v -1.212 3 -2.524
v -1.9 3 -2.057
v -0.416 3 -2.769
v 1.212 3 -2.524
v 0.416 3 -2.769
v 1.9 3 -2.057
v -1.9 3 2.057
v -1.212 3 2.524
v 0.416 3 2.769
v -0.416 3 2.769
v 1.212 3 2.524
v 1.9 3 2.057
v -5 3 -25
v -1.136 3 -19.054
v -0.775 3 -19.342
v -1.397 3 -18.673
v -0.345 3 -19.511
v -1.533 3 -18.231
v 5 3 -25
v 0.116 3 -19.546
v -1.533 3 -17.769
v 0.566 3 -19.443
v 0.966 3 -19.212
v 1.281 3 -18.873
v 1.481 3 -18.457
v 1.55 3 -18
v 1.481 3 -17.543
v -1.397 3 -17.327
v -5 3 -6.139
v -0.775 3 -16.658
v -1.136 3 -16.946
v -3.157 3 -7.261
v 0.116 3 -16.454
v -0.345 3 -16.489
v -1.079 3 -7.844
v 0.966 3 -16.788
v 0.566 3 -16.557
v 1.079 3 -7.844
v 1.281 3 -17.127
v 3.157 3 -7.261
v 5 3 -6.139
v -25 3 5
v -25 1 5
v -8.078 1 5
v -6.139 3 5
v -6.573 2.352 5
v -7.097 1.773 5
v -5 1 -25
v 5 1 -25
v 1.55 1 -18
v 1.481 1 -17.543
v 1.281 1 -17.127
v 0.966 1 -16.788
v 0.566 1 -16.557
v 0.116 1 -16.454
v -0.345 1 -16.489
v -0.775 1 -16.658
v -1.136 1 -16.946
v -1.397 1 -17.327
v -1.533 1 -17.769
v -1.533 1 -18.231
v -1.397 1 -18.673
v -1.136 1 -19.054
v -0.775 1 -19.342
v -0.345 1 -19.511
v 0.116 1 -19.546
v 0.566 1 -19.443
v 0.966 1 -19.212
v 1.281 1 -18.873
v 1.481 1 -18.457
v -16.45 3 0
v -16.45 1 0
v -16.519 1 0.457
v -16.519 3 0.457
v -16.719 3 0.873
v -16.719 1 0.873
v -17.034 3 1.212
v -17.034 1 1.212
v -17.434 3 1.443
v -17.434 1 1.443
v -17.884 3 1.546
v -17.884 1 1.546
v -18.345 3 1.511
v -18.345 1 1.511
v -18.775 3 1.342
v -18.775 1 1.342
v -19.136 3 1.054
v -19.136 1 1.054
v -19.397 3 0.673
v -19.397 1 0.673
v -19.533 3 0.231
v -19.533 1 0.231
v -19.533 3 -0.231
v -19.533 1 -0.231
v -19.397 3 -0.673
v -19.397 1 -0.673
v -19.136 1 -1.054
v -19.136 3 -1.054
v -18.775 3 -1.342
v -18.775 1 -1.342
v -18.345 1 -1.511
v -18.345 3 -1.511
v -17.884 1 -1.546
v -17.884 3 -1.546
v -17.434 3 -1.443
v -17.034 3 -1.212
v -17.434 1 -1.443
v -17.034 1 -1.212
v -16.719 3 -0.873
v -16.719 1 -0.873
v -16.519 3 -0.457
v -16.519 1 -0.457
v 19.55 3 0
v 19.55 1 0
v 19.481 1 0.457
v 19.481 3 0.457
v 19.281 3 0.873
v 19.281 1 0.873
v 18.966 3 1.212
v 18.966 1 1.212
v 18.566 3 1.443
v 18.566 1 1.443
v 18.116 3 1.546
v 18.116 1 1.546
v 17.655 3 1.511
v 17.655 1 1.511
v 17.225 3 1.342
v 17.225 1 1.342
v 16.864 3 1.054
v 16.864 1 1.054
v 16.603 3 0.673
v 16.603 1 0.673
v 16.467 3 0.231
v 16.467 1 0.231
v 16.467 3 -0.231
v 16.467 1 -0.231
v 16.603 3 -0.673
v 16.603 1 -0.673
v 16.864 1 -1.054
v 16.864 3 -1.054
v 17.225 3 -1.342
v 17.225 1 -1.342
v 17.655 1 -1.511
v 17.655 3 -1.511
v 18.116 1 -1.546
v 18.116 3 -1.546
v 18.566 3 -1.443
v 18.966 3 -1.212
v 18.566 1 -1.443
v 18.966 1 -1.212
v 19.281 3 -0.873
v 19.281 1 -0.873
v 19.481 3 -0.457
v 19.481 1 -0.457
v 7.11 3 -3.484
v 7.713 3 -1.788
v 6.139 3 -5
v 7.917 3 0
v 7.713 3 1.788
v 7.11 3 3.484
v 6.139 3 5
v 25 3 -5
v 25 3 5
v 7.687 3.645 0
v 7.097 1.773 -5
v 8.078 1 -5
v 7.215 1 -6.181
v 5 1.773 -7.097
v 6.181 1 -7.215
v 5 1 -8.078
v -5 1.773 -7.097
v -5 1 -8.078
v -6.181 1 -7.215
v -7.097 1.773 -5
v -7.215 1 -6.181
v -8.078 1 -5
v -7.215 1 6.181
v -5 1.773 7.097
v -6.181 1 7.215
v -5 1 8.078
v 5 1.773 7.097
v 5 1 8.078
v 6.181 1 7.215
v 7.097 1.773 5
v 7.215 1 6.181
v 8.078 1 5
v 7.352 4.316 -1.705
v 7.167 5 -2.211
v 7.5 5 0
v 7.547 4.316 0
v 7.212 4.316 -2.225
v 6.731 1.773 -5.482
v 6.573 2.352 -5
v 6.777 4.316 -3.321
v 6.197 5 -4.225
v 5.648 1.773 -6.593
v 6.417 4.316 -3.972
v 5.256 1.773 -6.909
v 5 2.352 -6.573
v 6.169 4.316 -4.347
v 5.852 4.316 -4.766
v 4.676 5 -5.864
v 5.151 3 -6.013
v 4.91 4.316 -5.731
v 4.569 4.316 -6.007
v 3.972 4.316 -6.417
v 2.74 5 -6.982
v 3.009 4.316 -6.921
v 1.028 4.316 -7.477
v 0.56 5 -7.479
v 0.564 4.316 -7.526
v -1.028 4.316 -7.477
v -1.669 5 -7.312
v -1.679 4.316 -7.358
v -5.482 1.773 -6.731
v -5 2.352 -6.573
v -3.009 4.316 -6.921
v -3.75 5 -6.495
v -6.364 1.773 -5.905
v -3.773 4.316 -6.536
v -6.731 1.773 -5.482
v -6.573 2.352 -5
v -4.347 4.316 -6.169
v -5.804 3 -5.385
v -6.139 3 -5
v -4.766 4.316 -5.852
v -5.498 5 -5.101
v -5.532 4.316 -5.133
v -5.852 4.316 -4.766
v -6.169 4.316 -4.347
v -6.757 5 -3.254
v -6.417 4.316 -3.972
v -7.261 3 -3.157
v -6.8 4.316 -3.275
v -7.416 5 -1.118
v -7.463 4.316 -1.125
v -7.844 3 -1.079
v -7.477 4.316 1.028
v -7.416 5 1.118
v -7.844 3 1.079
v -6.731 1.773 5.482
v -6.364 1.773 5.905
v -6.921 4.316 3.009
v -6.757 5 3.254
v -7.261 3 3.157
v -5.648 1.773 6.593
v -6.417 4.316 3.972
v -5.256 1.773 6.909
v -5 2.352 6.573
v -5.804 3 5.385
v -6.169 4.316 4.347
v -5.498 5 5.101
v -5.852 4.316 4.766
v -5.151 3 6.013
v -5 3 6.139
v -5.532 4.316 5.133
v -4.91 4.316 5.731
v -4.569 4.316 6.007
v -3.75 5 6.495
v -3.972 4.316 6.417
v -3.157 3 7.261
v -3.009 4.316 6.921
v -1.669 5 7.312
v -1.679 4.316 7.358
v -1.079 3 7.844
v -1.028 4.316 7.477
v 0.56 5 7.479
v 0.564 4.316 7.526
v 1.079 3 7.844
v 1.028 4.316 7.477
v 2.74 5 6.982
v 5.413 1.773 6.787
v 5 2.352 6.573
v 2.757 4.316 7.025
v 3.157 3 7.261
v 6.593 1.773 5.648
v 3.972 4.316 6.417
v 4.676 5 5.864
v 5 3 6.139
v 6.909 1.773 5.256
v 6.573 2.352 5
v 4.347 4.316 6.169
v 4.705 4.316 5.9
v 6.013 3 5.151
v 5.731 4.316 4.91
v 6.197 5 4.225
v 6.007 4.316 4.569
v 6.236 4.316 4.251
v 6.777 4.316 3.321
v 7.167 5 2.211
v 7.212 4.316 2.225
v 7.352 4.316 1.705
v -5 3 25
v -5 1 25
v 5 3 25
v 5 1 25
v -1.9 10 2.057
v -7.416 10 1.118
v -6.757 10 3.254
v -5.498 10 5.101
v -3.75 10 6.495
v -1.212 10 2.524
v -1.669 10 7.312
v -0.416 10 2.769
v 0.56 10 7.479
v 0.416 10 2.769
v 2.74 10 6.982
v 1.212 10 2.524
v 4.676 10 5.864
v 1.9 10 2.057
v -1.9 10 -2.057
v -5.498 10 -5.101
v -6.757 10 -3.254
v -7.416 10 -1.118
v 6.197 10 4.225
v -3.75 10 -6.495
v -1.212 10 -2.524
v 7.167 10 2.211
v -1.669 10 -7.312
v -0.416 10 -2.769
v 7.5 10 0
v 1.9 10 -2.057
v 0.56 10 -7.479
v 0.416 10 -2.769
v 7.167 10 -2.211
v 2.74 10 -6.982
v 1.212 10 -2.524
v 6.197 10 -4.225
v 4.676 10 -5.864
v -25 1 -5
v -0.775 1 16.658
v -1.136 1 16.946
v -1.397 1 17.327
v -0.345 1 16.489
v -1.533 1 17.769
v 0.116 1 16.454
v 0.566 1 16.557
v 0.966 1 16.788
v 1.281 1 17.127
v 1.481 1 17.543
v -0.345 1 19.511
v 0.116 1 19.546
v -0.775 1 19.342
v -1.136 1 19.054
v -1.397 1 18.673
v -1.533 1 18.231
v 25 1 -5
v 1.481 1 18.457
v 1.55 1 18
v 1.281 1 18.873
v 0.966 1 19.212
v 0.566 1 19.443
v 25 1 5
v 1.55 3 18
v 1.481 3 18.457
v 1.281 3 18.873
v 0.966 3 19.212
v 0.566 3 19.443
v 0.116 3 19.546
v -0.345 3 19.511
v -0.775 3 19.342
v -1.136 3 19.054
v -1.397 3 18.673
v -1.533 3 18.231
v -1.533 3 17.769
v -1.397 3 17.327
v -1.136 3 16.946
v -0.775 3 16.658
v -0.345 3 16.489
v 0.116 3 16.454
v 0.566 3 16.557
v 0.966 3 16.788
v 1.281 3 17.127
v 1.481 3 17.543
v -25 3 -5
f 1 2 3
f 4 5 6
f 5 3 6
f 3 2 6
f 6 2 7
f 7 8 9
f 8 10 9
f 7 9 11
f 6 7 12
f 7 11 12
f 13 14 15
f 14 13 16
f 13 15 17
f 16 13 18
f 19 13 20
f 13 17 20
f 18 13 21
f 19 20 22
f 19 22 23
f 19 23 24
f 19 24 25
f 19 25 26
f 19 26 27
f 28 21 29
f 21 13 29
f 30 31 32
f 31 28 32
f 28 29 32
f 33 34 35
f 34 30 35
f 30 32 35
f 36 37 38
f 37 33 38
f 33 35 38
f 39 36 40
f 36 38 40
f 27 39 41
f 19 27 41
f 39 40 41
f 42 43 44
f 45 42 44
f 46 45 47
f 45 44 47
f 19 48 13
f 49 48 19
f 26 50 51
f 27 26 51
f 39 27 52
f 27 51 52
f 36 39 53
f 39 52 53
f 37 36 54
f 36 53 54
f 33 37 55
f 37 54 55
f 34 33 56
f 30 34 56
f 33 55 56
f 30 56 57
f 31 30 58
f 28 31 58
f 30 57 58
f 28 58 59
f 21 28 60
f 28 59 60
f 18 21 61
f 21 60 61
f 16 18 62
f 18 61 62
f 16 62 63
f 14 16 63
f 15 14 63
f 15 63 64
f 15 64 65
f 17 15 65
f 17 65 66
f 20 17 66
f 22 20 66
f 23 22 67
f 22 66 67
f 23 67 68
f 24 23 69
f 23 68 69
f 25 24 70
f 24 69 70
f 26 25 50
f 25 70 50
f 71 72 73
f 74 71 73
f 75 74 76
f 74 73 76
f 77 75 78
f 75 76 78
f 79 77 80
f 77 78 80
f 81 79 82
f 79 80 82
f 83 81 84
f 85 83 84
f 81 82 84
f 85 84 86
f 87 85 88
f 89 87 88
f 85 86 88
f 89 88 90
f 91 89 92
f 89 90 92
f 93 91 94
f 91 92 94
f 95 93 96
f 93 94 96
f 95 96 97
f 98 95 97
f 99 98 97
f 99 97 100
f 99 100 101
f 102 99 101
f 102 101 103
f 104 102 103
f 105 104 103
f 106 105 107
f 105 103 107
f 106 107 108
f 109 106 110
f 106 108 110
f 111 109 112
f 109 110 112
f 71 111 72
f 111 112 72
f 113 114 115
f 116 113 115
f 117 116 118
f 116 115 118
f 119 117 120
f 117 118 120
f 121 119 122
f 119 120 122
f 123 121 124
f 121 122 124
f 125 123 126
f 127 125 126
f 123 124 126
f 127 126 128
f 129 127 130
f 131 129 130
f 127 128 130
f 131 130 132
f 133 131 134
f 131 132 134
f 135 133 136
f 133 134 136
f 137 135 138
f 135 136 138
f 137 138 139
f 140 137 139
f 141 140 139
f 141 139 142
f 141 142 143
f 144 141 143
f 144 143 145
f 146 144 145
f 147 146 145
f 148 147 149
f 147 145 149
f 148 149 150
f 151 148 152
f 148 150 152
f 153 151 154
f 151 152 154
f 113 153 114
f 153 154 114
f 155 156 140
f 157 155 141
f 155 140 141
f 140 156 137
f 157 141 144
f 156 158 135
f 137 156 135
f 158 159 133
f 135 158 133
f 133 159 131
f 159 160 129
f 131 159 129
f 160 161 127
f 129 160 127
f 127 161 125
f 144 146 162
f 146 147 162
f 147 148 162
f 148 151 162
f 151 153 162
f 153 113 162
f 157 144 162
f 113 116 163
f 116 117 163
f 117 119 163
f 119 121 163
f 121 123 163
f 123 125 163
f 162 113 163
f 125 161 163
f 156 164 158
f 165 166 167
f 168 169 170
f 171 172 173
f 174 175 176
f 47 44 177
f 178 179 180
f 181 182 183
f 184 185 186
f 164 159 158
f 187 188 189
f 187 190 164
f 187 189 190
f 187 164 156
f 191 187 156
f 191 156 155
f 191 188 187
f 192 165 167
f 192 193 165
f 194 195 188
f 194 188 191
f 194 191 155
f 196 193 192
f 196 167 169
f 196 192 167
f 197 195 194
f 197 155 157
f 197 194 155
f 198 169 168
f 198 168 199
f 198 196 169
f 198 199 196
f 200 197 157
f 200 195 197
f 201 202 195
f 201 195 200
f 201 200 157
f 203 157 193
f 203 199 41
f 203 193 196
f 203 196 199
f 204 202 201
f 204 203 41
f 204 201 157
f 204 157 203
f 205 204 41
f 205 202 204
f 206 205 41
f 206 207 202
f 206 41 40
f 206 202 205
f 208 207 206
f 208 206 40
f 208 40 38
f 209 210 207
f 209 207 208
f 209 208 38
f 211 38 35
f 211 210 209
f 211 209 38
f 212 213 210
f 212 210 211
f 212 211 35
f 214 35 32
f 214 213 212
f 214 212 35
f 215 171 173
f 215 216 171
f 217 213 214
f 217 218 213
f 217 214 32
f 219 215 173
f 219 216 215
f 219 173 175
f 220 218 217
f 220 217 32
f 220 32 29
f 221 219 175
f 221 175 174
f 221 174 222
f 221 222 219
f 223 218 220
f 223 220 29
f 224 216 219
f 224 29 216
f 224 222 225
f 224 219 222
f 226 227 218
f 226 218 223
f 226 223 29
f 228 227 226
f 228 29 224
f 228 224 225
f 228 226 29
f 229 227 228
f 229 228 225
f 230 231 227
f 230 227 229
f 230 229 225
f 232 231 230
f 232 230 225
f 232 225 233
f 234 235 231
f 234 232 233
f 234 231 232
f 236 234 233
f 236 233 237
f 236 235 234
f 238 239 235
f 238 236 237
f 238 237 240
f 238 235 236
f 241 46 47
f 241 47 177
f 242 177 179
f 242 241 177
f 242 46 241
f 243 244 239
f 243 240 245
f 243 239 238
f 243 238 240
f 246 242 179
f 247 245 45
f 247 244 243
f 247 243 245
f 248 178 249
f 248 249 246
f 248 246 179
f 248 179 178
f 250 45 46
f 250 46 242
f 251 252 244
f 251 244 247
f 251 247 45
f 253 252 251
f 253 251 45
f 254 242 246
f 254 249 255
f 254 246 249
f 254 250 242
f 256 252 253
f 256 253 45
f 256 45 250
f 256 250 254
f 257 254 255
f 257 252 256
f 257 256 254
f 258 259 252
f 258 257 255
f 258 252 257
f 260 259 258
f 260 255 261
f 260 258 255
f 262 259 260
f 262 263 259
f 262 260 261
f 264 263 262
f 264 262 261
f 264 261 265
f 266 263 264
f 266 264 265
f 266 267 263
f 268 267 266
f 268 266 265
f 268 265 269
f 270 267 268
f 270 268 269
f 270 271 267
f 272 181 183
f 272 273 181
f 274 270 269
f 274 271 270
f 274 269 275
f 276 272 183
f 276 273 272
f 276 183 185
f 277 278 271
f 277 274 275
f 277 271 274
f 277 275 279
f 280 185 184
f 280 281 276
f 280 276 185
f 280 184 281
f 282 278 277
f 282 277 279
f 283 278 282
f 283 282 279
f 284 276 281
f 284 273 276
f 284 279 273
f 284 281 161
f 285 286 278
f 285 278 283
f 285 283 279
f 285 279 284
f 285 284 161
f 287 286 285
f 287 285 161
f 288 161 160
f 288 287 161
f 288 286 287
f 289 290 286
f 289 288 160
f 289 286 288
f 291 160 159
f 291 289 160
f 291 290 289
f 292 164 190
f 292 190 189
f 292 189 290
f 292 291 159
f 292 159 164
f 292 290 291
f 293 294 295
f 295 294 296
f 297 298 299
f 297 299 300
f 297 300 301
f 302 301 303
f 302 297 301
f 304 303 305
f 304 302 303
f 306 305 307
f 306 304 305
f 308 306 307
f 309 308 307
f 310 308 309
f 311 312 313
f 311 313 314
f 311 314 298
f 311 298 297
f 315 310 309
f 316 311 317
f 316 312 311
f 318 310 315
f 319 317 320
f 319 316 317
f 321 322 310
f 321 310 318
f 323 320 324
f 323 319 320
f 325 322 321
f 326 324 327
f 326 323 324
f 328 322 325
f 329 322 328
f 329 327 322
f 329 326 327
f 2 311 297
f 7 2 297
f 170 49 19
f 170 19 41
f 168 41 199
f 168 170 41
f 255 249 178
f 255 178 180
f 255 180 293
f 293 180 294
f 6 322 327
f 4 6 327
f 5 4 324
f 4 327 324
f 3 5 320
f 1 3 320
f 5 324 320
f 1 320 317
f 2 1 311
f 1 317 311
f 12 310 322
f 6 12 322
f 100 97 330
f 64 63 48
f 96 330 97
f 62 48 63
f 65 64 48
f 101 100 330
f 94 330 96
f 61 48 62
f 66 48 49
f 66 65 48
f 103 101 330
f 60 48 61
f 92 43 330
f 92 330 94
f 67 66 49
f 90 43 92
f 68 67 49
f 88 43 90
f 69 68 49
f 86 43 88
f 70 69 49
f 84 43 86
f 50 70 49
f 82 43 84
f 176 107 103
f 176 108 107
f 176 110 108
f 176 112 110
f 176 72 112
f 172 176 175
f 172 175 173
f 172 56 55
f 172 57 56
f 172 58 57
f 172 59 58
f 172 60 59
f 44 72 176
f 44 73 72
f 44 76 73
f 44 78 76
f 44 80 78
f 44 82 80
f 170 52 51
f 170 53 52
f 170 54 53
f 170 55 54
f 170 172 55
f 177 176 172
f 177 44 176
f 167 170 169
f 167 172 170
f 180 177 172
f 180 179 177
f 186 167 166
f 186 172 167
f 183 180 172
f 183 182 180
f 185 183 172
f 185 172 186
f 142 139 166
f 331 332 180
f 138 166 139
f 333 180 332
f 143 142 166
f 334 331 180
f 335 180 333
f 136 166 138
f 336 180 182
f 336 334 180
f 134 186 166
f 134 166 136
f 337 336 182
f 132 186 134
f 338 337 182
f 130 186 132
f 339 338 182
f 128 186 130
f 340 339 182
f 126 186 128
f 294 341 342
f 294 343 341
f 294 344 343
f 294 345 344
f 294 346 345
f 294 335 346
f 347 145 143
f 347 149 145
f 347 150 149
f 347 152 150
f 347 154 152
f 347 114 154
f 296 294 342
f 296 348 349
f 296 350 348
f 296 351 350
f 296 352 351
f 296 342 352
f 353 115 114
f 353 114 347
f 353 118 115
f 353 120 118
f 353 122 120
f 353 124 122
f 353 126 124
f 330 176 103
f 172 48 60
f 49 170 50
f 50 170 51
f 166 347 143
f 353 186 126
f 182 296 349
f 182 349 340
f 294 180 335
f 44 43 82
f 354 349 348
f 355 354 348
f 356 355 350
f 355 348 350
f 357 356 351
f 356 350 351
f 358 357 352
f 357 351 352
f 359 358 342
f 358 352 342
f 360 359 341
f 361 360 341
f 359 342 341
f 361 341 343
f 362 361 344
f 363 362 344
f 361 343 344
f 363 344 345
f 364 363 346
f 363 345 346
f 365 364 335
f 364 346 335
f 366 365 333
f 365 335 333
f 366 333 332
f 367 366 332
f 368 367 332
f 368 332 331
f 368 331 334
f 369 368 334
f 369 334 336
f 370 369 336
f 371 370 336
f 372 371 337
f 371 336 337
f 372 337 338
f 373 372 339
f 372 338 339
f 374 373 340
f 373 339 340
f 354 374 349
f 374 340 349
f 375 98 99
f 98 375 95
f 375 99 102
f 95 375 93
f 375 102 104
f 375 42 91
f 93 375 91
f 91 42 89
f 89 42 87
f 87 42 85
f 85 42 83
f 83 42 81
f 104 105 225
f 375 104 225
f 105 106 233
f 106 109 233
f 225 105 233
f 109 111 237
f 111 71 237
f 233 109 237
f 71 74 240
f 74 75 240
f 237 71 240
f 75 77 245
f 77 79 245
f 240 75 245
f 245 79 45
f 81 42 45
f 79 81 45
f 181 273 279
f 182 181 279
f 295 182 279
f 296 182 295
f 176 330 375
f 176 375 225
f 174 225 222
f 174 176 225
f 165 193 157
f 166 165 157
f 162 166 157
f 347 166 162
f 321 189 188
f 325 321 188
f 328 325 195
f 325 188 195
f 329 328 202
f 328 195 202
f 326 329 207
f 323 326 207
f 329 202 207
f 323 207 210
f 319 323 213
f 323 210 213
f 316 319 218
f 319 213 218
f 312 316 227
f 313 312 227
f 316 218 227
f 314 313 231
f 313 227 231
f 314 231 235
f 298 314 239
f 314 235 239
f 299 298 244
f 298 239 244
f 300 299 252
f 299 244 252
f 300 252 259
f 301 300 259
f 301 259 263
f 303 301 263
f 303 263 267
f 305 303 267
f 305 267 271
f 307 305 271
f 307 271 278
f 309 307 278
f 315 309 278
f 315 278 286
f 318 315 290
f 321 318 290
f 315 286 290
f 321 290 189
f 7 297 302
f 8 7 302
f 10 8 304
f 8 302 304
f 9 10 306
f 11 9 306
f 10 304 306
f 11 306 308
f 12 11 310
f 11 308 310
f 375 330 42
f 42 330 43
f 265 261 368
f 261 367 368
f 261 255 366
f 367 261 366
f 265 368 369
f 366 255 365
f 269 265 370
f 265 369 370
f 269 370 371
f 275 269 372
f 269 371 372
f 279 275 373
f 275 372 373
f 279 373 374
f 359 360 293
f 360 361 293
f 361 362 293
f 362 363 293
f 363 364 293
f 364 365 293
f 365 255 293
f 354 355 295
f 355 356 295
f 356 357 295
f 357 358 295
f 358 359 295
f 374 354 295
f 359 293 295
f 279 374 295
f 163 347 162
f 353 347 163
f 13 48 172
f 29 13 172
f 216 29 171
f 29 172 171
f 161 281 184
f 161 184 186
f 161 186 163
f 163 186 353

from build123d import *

# Parameters (mm, degrees)
CROQUIS1_R              = 7.5
EXTRUIR1_DEPTH          = 10
EXTRUIR2_DEPTH          = 10
CROQUIS3_R              = 30
EXTRUIR3_DEPTH          = 9
REDONDEO1_R             = 5
EXTRUIR4_DEPTH          = 10
REDONDEO2_R             = 2
CROQUIS5_R              = 39.877660951
CORTAR_EXTRUIR1_DEPTH   = 10
CROQUIS7_W              = 10
CROQUIS7_H              = 50
SALIENTE_EXTRUIR1_DEPTH = 2
CROQUIS8_W              = 50
CROQUIS8_H              = 10
SALIENTE_EXTRUIR2_DEPTH = 2
CROQUIS10_R             = 1.55
CORTAR_EXTRUIR2_DEPTH   = 2


with BuildPart() as part:
    # Croquis1 → Extruir1 (new body)
    with BuildSketch(Plane(origin=(0, 0, 0), x_dir=(1, 0, 0), z_dir=(0, 1, 0))):
        Circle(CROQUIS1_R)
    extrude(amount=EXTRUIR1_DEPTH)

    # Croquis2 → Extruir2 (cut)
    with BuildSketch(Plane(origin=(0, 10, 0), x_dir=(1, 0, 0), z_dir=(0, 1, 0))):
        with BuildLine():
            Line((-1.9, 2.05669638), (-1.9, -2.05669638))
            ThreePointArc((-1.9, -2.05669638), (0, -2.8), (1.9, -2.05669638))
            Line((1.9, -2.05669638), (1.9, 2.05669638))
            ThreePointArc((1.9, 2.05669638), (0, 2.8), (-1.9, 2.05669638))
        make_face()
    extrude(amount=-EXTRUIR2_DEPTH, mode=Mode.SUBTRACT)

    # Croquis3 → Extruir3 (add)
    with BuildSketch(Plane.XZ):
        Circle(CROQUIS3_R)
    extrude(amount=EXTRUIR3_DEPTH)

    # Redondeo1
    redondeo1_edges = [part.edges().sort_by_distance(p)[0] for p in [
        (-7.5, 0, 0),
    ]]
    fillet(redondeo1_edges, radius=REDONDEO1_R)

    # Croquis4 → Extruir4 (cut)
    with BuildSketch(Plane(origin=(0, 0, 0), x_dir=(1, 0, 0), z_dir=(0, 1, 0))):
        with BuildLine():
            ThreePointArc((-13.896428557, -5.647058824), (-10.606601718, -10.606601718), (-5.647058824, -13.896428557))
            ThreePointArc((-5.647058824, -13.896428557), (-2.209821435, -22.039548299), (-10.352941176, -25.476785688))
            ThreePointArc((-10.352941176, -25.476785688), (-19.445436483, -19.445436483), (-25.476785688, -10.352941176))
            ThreePointArc((-25.476785688, -10.352941176), (-22.039548299, -2.209821435), (-13.896428557, -5.647058824))
        make_face()
        with BuildLine():
            ThreePointArc((-5.647058824, 13.896428557), (-2.209821435, 22.039548299), (-10.352941176, 25.476785688))
            ThreePointArc((-10.352941176, 25.476785688), (-19.445436483, 19.445436483), (-25.476785688, 10.352941176))
            ThreePointArc((-25.476785688, 10.352941176), (-22.039548299, 2.209821435), (-13.896428557, 5.647058824))
            ThreePointArc((-13.896428557, 5.647058824), (-10.606601718, 10.606601718), (-5.647058824, 13.896428557))
        make_face()
        with BuildLine():
            ThreePointArc((10.352941176, 25.476785688), (2.209821435, 22.039548299), (5.647058824, 13.896428557))
            ThreePointArc((5.647058824, 13.896428557), (10.606601718, 10.606601718), (13.896428557, 5.647058824))
            ThreePointArc((13.896428557, 5.647058824), (22.039548299, 2.209821435), (25.476785688, 10.352941176))
            ThreePointArc((25.476785688, 10.352941176), (19.445436483, 19.445436483), (10.352941176, 25.476785688))
        make_face()
        with BuildLine():
            ThreePointArc((5.647058824, -13.896428557), (2.209821435, -22.039548299), (10.352941176, -25.476785688))
            ThreePointArc((10.352941176, -25.476785688), (19.445436483, -19.445436483), (25.476785688, -10.352941176))
            ThreePointArc((25.476785688, -10.352941176), (22.039548299, -2.209821435), (13.896428557, -5.647058824))
            ThreePointArc((13.896428557, -5.647058824), (10.606601718, -10.606601718), (5.647058824, -13.896428557))
        make_face()
    extrude(amount=-EXTRUIR4_DEPTH, mode=Mode.SUBTRACT)

    # Redondeo2
    redondeo2_edges = [part.edges().sort_by_distance(p)[0] for p in [
        (-30, 0, 0),
        (-30, -9, 0),
    ]]
    fillet(redondeo2_edges, radius=REDONDEO2_R)

    # Croquis5 → Cortar-Extruir1 (cut)
    with BuildSketch(Plane.XZ.offset(9)):
        Circle(CROQUIS5_R)
    extrude(amount=-CORTAR_EXTRUIR1_DEPTH, mode=Mode.SUBTRACT)

    # Croquis7 → Saliente-Extruir1 (add)
    with BuildSketch(Plane.XZ.offset(-1)):
        Rectangle(CROQUIS7_W, CROQUIS7_H)
    extrude(amount=-SALIENTE_EXTRUIR1_DEPTH)

    # Croquis8 → Saliente-Extruir2 (add)
    with BuildSketch(Plane.XZ.offset(-1)):
        Rectangle(CROQUIS8_W, CROQUIS8_H)
    extrude(amount=-SALIENTE_EXTRUIR2_DEPTH)

    # Croquis10 → Cortar-Extruir2 (cut)
    with BuildSketch(Plane.XZ.offset(-1)):
        with Locations((-18, 0)):
            Circle(CROQUIS10_R)
        with Locations((0, 18)):
            Circle(CROQUIS10_R)
        with Locations((0, -18)):
            Circle(CROQUIS10_R)
        with Locations((18, 0)):
            Circle(CROQUIS10_R)
    extrude(amount=-CORTAR_EXTRUIR2_DEPTH, mode=Mode.SUBTRACT)


solid = part.part
